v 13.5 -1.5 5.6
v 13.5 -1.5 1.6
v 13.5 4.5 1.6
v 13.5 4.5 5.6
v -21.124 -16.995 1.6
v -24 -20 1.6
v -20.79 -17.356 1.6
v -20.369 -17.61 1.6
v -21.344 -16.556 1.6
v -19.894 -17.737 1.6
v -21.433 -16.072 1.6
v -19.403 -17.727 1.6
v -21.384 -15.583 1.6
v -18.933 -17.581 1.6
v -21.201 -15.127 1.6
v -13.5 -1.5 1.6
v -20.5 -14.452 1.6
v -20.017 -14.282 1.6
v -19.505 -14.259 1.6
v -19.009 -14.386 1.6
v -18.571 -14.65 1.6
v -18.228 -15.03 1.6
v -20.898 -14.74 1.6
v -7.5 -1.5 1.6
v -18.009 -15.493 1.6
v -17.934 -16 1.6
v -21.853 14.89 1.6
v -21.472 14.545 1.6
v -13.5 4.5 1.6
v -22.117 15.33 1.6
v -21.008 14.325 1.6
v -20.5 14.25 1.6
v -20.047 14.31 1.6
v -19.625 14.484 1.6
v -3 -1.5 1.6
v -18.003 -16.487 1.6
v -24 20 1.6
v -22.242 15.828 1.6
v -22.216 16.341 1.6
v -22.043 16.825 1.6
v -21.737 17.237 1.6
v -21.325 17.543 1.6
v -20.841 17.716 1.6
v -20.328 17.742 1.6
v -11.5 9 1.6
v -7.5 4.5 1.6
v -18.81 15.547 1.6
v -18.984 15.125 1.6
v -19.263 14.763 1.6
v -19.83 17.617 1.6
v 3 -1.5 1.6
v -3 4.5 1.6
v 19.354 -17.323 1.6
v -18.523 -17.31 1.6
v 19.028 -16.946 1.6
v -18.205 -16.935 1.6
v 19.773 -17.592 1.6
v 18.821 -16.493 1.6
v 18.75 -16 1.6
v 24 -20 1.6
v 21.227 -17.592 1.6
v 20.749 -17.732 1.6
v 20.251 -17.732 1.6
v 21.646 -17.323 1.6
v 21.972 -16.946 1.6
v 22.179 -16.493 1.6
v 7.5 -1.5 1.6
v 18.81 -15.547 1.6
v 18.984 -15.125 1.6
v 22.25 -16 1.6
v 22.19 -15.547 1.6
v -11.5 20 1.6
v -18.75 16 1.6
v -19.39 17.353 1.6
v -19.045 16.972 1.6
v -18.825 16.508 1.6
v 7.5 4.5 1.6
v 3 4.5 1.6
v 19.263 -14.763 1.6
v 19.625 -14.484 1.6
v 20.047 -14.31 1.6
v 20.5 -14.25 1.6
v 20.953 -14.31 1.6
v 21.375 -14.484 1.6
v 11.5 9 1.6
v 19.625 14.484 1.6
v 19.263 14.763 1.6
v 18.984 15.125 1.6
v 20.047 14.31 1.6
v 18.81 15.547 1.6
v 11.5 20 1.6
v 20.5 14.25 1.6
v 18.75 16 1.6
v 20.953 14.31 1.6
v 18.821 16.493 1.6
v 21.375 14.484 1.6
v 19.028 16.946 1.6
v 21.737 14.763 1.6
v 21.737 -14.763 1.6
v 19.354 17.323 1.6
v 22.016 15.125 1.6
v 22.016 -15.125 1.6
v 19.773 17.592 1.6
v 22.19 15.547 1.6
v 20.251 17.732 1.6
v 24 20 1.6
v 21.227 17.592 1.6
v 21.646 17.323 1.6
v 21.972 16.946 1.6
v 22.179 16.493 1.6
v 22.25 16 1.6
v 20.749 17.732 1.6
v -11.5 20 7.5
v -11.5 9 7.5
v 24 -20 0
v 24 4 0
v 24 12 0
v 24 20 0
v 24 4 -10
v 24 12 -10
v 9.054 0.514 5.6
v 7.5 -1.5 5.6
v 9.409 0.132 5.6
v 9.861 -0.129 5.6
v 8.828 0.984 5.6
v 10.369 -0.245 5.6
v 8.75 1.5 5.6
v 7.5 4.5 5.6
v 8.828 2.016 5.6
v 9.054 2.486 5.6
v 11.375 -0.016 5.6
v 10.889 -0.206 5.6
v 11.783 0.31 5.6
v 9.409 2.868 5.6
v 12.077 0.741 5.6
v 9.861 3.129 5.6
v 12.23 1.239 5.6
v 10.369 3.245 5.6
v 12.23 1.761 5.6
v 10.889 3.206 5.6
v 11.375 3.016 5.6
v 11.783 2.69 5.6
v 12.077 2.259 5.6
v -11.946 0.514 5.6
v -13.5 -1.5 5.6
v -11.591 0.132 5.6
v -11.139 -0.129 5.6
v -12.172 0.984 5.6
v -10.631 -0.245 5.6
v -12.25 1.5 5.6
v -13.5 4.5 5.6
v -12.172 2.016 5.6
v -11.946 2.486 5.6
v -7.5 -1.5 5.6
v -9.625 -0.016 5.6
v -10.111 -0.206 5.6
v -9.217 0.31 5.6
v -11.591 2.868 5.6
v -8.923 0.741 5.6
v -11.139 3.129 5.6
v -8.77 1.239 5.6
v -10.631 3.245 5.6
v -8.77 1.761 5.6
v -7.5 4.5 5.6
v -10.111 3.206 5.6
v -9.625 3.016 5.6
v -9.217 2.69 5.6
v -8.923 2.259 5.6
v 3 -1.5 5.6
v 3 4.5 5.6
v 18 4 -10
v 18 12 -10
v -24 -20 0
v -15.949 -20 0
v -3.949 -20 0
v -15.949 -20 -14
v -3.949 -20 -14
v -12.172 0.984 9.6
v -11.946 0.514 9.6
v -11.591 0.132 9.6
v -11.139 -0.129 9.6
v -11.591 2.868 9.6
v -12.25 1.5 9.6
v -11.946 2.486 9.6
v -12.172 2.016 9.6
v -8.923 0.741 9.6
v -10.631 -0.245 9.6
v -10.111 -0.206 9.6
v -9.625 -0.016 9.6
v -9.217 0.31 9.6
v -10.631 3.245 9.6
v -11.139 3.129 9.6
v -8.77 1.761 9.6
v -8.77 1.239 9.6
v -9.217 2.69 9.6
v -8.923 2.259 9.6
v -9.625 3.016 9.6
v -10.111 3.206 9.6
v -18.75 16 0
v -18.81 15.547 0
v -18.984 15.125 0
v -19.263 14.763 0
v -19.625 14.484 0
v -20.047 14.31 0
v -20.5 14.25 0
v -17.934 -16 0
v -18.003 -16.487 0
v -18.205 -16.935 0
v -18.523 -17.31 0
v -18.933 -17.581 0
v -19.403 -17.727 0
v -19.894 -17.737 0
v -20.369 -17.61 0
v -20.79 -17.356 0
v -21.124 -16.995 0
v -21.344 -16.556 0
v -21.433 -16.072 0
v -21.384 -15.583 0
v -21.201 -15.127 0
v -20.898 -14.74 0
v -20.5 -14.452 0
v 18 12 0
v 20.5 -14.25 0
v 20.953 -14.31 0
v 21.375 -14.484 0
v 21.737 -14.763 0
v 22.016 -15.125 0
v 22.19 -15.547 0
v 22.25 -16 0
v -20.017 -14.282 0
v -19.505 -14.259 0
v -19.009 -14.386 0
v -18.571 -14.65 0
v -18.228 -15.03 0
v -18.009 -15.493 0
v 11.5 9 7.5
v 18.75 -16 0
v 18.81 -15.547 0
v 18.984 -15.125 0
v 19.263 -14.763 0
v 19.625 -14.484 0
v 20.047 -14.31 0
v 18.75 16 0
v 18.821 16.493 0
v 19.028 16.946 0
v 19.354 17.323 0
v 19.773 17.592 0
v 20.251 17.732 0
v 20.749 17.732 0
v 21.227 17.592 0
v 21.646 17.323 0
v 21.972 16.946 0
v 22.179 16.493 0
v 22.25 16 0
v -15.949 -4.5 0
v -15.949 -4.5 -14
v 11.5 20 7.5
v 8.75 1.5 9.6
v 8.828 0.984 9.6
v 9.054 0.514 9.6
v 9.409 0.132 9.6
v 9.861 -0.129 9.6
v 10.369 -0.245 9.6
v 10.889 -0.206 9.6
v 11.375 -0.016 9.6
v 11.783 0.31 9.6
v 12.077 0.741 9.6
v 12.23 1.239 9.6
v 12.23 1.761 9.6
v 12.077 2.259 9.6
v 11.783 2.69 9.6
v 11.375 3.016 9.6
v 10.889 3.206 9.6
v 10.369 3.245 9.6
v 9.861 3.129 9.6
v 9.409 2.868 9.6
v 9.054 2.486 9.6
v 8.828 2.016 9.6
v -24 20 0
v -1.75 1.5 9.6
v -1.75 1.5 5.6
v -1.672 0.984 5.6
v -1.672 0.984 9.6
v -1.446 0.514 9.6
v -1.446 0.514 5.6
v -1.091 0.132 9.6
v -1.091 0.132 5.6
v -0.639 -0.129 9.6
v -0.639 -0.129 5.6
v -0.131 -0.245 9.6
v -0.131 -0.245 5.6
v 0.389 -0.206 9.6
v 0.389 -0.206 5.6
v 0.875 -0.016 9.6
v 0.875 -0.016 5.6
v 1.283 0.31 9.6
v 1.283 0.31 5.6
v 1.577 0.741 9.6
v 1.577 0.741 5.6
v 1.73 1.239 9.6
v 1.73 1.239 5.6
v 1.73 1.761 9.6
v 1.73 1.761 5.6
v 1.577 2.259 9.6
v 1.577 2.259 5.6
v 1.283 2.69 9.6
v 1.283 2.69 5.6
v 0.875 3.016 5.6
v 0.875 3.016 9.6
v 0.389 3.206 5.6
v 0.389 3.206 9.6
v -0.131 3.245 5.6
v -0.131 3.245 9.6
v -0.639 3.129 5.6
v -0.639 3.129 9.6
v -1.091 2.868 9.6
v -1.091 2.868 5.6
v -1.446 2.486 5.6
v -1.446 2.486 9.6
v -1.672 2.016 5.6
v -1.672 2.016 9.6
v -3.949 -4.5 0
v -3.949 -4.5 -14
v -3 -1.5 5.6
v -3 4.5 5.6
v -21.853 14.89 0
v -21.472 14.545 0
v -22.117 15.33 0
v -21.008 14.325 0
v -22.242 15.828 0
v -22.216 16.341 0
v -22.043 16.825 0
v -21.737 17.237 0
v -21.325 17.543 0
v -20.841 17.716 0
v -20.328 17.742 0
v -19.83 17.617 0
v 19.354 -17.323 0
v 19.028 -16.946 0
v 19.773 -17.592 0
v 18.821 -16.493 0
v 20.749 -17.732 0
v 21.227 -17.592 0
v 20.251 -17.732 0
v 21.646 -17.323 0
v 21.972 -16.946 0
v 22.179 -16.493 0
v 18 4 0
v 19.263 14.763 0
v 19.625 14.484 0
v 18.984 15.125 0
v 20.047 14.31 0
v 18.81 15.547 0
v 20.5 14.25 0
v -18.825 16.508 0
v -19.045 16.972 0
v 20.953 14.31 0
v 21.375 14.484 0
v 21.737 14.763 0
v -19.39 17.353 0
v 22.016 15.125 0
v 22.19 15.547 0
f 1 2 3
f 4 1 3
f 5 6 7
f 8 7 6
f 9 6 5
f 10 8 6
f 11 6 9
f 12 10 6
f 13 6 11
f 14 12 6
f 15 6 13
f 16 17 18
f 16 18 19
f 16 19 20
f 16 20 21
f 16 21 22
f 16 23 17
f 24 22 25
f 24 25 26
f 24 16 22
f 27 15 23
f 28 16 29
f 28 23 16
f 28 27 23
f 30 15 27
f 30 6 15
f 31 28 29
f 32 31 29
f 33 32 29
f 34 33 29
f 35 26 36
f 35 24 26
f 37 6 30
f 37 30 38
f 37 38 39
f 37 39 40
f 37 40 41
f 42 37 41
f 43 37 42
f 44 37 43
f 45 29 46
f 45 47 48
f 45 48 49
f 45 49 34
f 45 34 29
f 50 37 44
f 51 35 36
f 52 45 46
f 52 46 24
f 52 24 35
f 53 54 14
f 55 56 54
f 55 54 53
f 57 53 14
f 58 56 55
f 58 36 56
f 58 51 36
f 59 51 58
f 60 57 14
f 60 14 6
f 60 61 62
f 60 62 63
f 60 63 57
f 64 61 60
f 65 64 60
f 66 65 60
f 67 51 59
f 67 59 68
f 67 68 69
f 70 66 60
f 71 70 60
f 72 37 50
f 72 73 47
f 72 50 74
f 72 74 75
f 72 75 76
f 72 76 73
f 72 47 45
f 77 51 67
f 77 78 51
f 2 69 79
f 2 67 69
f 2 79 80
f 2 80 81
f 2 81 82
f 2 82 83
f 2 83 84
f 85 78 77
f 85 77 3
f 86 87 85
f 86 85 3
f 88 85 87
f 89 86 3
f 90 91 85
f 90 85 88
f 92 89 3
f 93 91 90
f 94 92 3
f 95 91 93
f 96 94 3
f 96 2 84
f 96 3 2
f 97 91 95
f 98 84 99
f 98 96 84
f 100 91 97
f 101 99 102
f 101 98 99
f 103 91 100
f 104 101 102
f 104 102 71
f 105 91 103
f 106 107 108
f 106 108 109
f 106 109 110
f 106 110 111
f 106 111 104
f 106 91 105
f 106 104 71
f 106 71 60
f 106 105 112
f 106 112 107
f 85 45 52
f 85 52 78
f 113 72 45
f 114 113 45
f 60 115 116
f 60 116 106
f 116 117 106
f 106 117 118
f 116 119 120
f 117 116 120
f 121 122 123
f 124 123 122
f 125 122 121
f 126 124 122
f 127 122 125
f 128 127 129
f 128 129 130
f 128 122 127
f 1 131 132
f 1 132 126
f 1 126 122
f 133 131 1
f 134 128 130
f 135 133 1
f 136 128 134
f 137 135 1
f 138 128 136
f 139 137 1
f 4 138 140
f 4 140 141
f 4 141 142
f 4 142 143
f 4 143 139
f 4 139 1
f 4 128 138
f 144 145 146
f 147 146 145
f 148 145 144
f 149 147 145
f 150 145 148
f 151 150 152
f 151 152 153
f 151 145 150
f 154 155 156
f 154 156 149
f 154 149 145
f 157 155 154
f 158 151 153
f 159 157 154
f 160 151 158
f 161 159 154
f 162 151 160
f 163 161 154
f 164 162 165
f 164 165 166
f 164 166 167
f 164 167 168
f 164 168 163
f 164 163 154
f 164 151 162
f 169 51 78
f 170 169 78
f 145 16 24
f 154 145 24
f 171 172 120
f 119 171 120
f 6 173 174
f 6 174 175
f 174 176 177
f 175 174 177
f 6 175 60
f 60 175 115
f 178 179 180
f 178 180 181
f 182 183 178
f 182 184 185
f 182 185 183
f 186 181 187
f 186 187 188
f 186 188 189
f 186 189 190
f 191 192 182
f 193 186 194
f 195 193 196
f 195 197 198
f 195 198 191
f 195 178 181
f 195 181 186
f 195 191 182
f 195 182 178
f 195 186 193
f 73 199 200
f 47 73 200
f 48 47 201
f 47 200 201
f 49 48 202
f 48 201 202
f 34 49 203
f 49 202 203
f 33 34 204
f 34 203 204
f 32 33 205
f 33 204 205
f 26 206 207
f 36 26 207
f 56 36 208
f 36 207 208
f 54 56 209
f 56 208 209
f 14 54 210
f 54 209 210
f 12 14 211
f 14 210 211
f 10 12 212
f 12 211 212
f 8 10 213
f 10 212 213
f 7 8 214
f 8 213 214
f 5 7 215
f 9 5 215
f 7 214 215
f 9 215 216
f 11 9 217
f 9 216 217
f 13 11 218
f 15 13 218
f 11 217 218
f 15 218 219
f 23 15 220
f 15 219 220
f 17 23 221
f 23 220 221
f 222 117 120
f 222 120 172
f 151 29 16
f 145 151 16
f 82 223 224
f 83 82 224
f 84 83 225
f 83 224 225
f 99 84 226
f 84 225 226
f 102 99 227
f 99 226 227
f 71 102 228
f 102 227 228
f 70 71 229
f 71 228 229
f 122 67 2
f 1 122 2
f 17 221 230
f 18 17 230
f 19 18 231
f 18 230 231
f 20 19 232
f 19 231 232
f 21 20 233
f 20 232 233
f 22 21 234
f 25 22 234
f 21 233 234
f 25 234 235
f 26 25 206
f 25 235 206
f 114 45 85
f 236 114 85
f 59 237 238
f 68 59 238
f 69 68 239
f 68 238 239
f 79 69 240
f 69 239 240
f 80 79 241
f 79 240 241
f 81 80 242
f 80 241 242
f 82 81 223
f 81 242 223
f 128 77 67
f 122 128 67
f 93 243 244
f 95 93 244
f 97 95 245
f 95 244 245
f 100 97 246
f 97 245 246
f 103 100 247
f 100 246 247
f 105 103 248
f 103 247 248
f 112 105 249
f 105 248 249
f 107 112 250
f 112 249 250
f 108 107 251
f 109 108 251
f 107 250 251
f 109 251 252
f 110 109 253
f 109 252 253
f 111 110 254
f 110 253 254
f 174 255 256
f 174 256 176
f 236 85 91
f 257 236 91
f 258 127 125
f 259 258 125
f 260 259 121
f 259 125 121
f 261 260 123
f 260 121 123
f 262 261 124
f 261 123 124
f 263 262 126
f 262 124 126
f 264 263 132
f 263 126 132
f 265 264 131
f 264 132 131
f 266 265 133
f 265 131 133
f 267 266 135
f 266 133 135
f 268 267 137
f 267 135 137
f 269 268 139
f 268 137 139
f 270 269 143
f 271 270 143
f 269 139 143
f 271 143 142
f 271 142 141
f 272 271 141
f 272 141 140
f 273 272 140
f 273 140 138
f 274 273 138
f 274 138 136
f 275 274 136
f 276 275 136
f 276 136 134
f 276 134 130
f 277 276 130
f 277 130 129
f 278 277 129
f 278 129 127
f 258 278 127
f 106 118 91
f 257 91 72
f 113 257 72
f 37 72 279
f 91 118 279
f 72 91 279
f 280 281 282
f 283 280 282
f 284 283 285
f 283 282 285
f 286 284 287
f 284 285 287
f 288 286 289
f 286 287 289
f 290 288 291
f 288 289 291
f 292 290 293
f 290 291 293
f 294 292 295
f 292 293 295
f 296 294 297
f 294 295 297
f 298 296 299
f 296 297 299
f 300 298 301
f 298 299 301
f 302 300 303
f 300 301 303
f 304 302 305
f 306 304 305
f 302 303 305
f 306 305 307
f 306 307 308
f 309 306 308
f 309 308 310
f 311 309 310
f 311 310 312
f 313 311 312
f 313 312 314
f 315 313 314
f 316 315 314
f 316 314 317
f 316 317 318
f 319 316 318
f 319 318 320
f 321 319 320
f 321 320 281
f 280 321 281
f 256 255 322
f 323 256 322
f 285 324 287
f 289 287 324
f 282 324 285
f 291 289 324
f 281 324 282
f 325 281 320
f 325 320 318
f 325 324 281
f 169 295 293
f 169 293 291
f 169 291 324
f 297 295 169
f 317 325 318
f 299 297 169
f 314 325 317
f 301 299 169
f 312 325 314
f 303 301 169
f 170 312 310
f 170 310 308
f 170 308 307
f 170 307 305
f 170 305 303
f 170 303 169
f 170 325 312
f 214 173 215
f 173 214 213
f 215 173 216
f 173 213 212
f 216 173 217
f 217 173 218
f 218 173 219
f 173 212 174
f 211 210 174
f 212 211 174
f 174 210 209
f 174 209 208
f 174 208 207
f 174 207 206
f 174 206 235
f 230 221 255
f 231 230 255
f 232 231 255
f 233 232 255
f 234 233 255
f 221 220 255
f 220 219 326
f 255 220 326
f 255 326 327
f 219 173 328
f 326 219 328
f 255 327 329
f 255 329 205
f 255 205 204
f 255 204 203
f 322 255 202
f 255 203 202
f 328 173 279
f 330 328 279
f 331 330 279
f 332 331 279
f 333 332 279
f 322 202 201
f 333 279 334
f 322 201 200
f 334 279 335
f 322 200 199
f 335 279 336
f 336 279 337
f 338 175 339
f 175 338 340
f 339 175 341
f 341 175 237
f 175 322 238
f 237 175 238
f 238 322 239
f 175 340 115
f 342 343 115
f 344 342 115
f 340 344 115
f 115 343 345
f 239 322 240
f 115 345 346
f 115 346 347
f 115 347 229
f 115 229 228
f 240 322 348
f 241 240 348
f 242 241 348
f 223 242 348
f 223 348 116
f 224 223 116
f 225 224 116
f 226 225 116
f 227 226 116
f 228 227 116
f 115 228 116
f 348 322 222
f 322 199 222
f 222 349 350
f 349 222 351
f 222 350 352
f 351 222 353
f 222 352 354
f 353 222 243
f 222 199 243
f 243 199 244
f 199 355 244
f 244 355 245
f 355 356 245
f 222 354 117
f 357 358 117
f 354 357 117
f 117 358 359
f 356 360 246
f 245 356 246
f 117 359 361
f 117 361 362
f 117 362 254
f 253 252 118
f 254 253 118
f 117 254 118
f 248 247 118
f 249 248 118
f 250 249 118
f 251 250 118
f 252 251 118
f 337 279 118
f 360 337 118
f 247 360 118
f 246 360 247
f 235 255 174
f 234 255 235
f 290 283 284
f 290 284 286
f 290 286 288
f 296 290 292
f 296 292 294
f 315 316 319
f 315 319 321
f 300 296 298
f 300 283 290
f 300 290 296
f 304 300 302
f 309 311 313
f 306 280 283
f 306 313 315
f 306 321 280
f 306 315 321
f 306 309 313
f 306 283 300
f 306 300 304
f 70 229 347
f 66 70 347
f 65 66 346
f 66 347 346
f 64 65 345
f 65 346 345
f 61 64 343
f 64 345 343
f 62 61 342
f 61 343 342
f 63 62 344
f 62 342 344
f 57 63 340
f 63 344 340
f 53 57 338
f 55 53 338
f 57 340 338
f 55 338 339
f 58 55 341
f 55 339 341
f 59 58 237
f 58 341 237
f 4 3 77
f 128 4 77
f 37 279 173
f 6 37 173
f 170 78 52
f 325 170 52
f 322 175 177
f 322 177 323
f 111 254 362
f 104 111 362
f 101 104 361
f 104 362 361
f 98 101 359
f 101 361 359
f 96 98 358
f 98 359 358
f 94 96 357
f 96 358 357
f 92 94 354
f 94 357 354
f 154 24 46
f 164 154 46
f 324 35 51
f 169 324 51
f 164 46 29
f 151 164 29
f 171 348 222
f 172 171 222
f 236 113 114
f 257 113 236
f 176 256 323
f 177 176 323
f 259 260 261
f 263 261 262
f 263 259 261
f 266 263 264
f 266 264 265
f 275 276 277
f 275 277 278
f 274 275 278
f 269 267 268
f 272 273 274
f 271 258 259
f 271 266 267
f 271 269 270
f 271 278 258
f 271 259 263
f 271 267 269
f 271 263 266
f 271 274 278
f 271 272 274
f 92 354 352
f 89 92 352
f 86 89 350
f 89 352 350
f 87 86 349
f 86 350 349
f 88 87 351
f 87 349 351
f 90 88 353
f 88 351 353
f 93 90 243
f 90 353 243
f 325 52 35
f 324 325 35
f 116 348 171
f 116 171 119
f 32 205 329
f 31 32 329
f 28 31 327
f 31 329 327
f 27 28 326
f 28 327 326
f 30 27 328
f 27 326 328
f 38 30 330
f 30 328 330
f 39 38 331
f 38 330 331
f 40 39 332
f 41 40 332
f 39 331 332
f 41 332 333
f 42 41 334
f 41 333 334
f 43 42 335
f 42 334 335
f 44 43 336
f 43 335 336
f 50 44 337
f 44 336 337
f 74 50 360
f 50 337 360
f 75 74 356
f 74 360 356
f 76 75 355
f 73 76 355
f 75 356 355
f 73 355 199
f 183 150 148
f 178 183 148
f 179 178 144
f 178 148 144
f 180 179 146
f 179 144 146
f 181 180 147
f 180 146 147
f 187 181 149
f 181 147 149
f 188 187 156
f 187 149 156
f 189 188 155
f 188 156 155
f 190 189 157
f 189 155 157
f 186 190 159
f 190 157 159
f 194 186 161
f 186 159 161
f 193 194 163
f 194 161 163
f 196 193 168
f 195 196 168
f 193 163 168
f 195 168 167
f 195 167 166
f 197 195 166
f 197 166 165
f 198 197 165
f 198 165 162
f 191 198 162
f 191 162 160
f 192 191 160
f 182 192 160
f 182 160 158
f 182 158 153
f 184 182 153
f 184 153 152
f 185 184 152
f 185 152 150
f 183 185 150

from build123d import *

# Parameters (mm, degrees)
F0_W     = 12
F0_H     = 11.5
F0_H_2   = 4
F0_W_2   = 3.5
F0_H_3   = 8
F0_H_4   = 2.5
F0_W_3   = 2.5
F1_DEPTH = 1.6
F0_W_4   = 23
F0_H_5   = 7
F2_DEPTH = 7.5
F3_DEPTH = 5.6
F4_DEPTH = 9.6
F5_DEPTH = 14
F6_DEPTH = 10


with BuildPart() as f1:
    # F0 (on Top) → F1 (new body)
    with BuildSketch(Plane.XY):
        with BuildLine():
            Line((-11.5, 16), (-18.75, 16))
            ThreePointArc((-18.75, 16), (-19.2625631329, 14.7625631329), (-20.5, 14.25))
            Line((-20.5, 14.25), (-20.5, 1.5))
            Line((-20.5, 1.5), (-13.5, 1.5))
            Line((-13.5, 1.5), (-13.5, 4.5))
            Line((-13.5, 4.5), (-7.5, 4.5))
            Line((-7.5, 4.5), (-7.5, 1.5))
            Line((-7.5, 1.5), (-3, 1.5))
            Line((-3, 1.5), (-3, 4.5))
            Line((-3, 4.5), (3, 4.5))
            Line((3, 4.5), (3, 1.5))
            Line((3, 1.5), (7.5, 1.5))
            Line((7.5, 1.5), (7.5, 4.5))
            Line((7.5, 4.5), (13.5, 4.5))
            Line((13.5, 4.5), (13.5, 1.5))
            Line((13.5, 1.5), (20.5, 1.5))
            Line((20.5, 1.5), (20.5, 4))
            Line((20.5, 4), (18, 4))
            Line((18, 4), (18, 12))
            Line((18, 12), (20.5, 12))
            Line((20.5, 12), (20.5, 14.25))
            ThreePointArc((20.5, 14.25), (19.2625631329, 14.7625631329), (18.75, 16))
            Line((18.75, 16), (11.5, 16))
            Line((11.5, 16), (11.5, 9))
            Line((11.5, 9), (-11.5, 9))
            Line((-11.5, 9), (-11.5, 16))
        make_face()
        with BuildLine():
            ThreePointArc((-20.5, 14.25), (-21.7374368671, 17.2374368671), (-18.75, 16))
            Line((-18.75, 16), (-11.5, 16))
            Line((-11.5, 16), (-11.5, 20))
            Line((-11.5, 20), (-24, 20))
            Line((-24, 20), (-24, 1.5))
            Line((-24, 1.5), (-20.5, 1.5))
            Line((-20.5, 1.5), (-20.5, 14.25))
        make_face()
        with BuildLine():
            Line((11.5, 20), (11.5, 16))
            Line((11.5, 16), (18.75, 16))
            ThreePointArc((18.75, 16), (20.5, 17.75), (22.25, 16))
            ThreePointArc((22.25, 16), (21.7374368671, 14.7625631329), (20.5, 14.25))
            Line((20.5, 14.25), (20.5, 12))
            Line((20.5, 12), (24, 12))
            Line((24, 12), (24, 20))
            Line((24, 20), (11.5, 20))
        make_face()
        with BuildLine():
            Line((-13.5, 1.5), (-20.5, 1.5))
            Line((-20.5, 1.5), (-20.5, -14.4517312036))
            ThreePointArc((-20.5, -14.4517312036), (-18.7801368934, -14.5016722582), (-17.9343016893, -16))
            Line((-17.9343016893, -16), (-15.9493740648, -16))
            Line((-15.9493740648, -16), (-15.9493740648, -4.5))
            Line((-15.9493740648, -4.5), (-3.9493740648, -4.5))
            Line((-3.9493740648, -4.5), (-3.9493740648, -16))
            Line((-3.9493740648, -16), (18.75, -16))
            ThreePointArc((18.75, -16), (19.2625631329, -14.7625631329), (20.5, -14.25))
            Line((20.5, -14.25), (20.5, 1.5))
            Line((20.5, 1.5), (13.5, 1.5))
            Line((13.5, 1.5), (13.5, -1.5))
            Line((13.5, -1.5), (7.5, -1.5))
            Line((7.5, -1.5), (7.5, 1.5))
            Line((7.5, 1.5), (3, 1.5))
            Line((3, 1.5), (3, -1.5))
            Line((3, -1.5), (-3, -1.5))
            Line((-3, -1.5), (-3, 1.5))
            Line((-3, 1.5), (-7.5, 1.5))
            Line((-7.5, 1.5), (-7.5, -1.5))
            Line((-7.5, -1.5), (-13.5, -1.5))
            Line((-13.5, -1.5), (-13.5, 1.5))
        make_face()
        with BuildLine():
            Line((-20.5, -14.4517312036), (-20.5, 1.5))
            Line((-20.5, 1.5), (-24, 1.5))
            Line((-24, 1.5), (-24, -20))
            Line((-24, -20), (-15.9493740648, -20))
            Line((-15.9493740648, -20), (-15.9493740648, -16))
            Line((-15.9493740648, -16), (-17.9343016893, -16))
            ThreePointArc((-17.9343016893, -16), (-20.5884664851, -17.4983277418), (-20.5, -14.4517312036))
        make_face()
        with BuildLine():
            Line((18.75, -16), (-3.9493740648, -16))
            Line((-3.9493740648, -16), (-3.9493740648, -20))
            Line((-3.9493740648, -20), (24, -20))
            Line((24, -20), (24, 1.5))
            Line((24, 1.5), (20.5, 1.5))
            Line((20.5, 1.5), (20.5, -14.25))
            ThreePointArc((20.5, -14.25), (21.7374368671, -14.7625631329), (22.25, -16))
            ThreePointArc((22.25, -16), (20.5, -17.75), (18.75, -16))
        make_face()
        with Locations((-9.9493740648, -10.25)):
            Rectangle(F0_W, F0_H)
        with Locations((-9.9493740648, -18)):
            Rectangle(F0_W, F0_H_2)
        with Locations((22.25, 8)):
            Rectangle(F0_W_2, F0_H_3)
        with Locations((22.25, 2.75)):
            Rectangle(F0_W_2, F0_H_4)
        with Locations((19.25, 8)):
            Rectangle(F0_W_3, F0_H_3)
        with BuildLine():
            Line((-13.5, 4.5), (-13.5, 1.5))
            Line((-13.5, 1.5), (-12.25, 1.5))
            ThreePointArc((-12.25, 1.5), (-10.5, 3.25), (-8.75, 1.5))
            Line((-8.75, 1.5), (-7.5, 1.5))
            Line((-7.5, 1.5), (-7.5, 4.5))
            Line((-7.5, 4.5), (-13.5, 4.5))
        make_face()
        with BuildLine():
            Line((-3, 4.5), (-3, 1.5))
            Line((-3, 1.5), (-1.75, 1.5))
            ThreePointArc((-1.75, 1.5), (0, 3.25), (1.75, 1.5))
            Line((1.75, 1.5), (3, 1.5))
            Line((3, 1.5), (3, 4.5))
            Line((3, 4.5), (-3, 4.5))
        make_face()
        with BuildLine():
            Line((12.25, 1.5), (13.5, 1.5))
            Line((13.5, 1.5), (13.5, 4.5))
            Line((13.5, 4.5), (7.5, 4.5))
            Line((7.5, 4.5), (7.5, 1.5))
            Line((7.5, 1.5), (8.75, 1.5))
            ThreePointArc((8.75, 1.5), (10.5, 3.25), (12.25, 1.5))
        make_face()
        with BuildLine():
            ThreePointArc((-8.75, 1.5), (-10.5, 3.25), (-12.25, 1.5))
            Line((-12.25, 1.5), (-8.75, 1.5))
        make_face()
        with BuildLine():
            Line((-8.75, 1.5), (-12.25, 1.5))
            ThreePointArc((-12.25, 1.5), (-10.5, -0.25), (-8.75, 1.5))
        make_face()
        with BuildLine():
            Line((-12.25, 1.5), (-13.5, 1.5))
            Line((-13.5, 1.5), (-13.5, -1.5))
            Line((-13.5, -1.5), (-7.5, -1.5))
            Line((-7.5, -1.5), (-7.5, 1.5))
            Line((-7.5, 1.5), (-8.75, 1.5))
            ThreePointArc((-8.75, 1.5), (-10.5, -0.25), (-12.25, 1.5))
        make_face()
        with BuildLine():
            Line((-1.75, 1.5), (-3, 1.5))
            Line((-3, 1.5), (-3, -1.5))
            Line((-3, -1.5), (3, -1.5))
            Line((3, -1.5), (3, 1.5))
            Line((3, 1.5), (1.75, 1.5))
            ThreePointArc((1.75, 1.5), (0, -0.25), (-1.75, 1.5))
        make_face()
        with BuildLine():
            Line((1.75, 1.5), (-1.75, 1.5))
            ThreePointArc((-1.75, 1.5), (0, -0.25), (1.75, 1.5))
        make_face()
        with BuildLine():
            ThreePointArc((1.75, 1.5), (0, 3.25), (-1.75, 1.5))
            Line((-1.75, 1.5), (1.75, 1.5))
        make_face()
        with BuildLine():
            Line((8.75, 1.5), (12.25, 1.5))
            ThreePointArc((12.25, 1.5), (10.5, 3.25), (8.75, 1.5))
        make_face()
        with BuildLine():
            ThreePointArc((8.75, 1.5), (10.5, -0.25), (12.25, 1.5))
            Line((12.25, 1.5), (8.75, 1.5))
        make_face()
        with BuildLine():
            Line((13.5, -1.5), (13.5, 1.5))
            Line((13.5, 1.5), (12.25, 1.5))
            ThreePointArc((12.25, 1.5), (10.5, -0.25), (8.75, 1.5))
            Line((8.75, 1.5), (7.5, 1.5))
            Line((7.5, 1.5), (7.5, -1.5))
            Line((7.5, -1.5), (13.5, -1.5))
        make_face()
    extrude(amount=F1_DEPTH)

    # F0 (on Top) → F2 (join)
    with BuildSketch(Plane.XY):
        with Locations((0, 12.5)):
            Rectangle(F0_W_4, F0_H_5)
        with Locations((0, 18)):
            Rectangle(F0_W_4, F0_H_2)
    extrude(amount=F2_DEPTH)

    # F0 (on Top) → F3 (join)
    with BuildSketch(Plane.XY):
        with BuildLine():
            Line((-13.5, 4.5), (-13.5, 1.5))
            Line((-13.5, 1.5), (-12.25, 1.5))
            ThreePointArc((-12.25, 1.5), (-10.5, 3.25), (-8.75, 1.5))
            Line((-8.75, 1.5), (-7.5, 1.5))
            Line((-7.5, 1.5), (-7.5, 4.5))
            Line((-7.5, 4.5), (-13.5, 4.5))
        make_face()
        with BuildLine():
            Line((-12.25, 1.5), (-13.5, 1.5))
            Line((-13.5, 1.5), (-13.5, -1.5))
            Line((-13.5, -1.5), (-7.5, -1.5))
            Line((-7.5, -1.5), (-7.5, 1.5))
            Line((-7.5, 1.5), (-8.75, 1.5))
            ThreePointArc((-8.75, 1.5), (-10.5, -0.25), (-12.25, 1.5))
        make_face()
        with BuildLine():
            Line((-3, 4.5), (-3, 1.5))
            Line((-3, 1.5), (-1.75, 1.5))
            ThreePointArc((-1.75, 1.5), (0, 3.25), (1.75, 1.5))
            Line((1.75, 1.5), (3, 1.5))
            Line((3, 1.5), (3, 4.5))
            Line((3, 4.5), (-3, 4.5))
        make_face()
        with BuildLine():
            Line((-1.75, 1.5), (-3, 1.5))
            Line((-3, 1.5), (-3, -1.5))
            Line((-3, -1.5), (3, -1.5))
            Line((3, -1.5), (3, 1.5))
            Line((3, 1.5), (1.75, 1.5))
            ThreePointArc((1.75, 1.5), (0, -0.25), (-1.75, 1.5))
        make_face()
        with BuildLine():
            Line((12.25, 1.5), (13.5, 1.5))
            Line((13.5, 1.5), (13.5, 4.5))
            Line((13.5, 4.5), (7.5, 4.5))
            Line((7.5, 4.5), (7.5, 1.5))
            Line((7.5, 1.5), (8.75, 1.5))
            ThreePointArc((8.75, 1.5), (10.5, 3.25), (12.25, 1.5))
        make_face()
        with BuildLine():
            Line((13.5, -1.5), (13.5, 1.5))
            Line((13.5, 1.5), (12.25, 1.5))
            ThreePointArc((12.25, 1.5), (10.5, -0.25), (8.75, 1.5))
            Line((8.75, 1.5), (7.5, 1.5))
            Line((7.5, 1.5), (7.5, -1.5))
            Line((7.5, -1.5), (13.5, -1.5))
        make_face()
    extrude(amount=F3_DEPTH)

    # F0 (on Top) → F4 (join)
    with BuildSketch(Plane.XY):
        with BuildLine():
            ThreePointArc((1.75, 1.5), (0, 3.25), (-1.75, 1.5))
            Line((-1.75, 1.5), (1.75, 1.5))
        make_face()
        with BuildLine():
            Line((1.75, 1.5), (-1.75, 1.5))
            ThreePointArc((-1.75, 1.5), (0, -0.25), (1.75, 1.5))
        make_face()
        with BuildLine():
            ThreePointArc((-8.75, 1.5), (-10.5, 3.25), (-12.25, 1.5))
            Line((-12.25, 1.5), (-8.75, 1.5))
        make_face()
        with BuildLine():
            Line((-8.75, 1.5), (-12.25, 1.5))
            ThreePointArc((-12.25, 1.5), (-10.5, -0.25), (-8.75, 1.5))
        make_face()
        with BuildLine():
            Line((8.75, 1.5), (12.25, 1.5))
            ThreePointArc((12.25, 1.5), (10.5, 3.25), (8.75, 1.5))
        make_face()
        with BuildLine():
            ThreePointArc((8.75, 1.5), (10.5, -0.25), (12.25, 1.5))
            Line((12.25, 1.5), (8.75, 1.5))
        make_face()
    extrude(amount=F4_DEPTH)

    # F0 (on Top) → F5 (join)
    with BuildSketch(Plane.XY):
        with Locations((-9.9493740648, -10.25)):
            Rectangle(F0_W, F0_H)
        with Locations((-9.9493740648, -18)):
            Rectangle(F0_W, F0_H_2)
    extrude(amount=-F5_DEPTH)

    # F0 (on Top) → F6 (join)
    with BuildSketch(Plane.XY):
        with Locations((22.25, 8)):
            Rectangle(F0_W_2, F0_H_3)
        with Locations((19.25, 8)):
            Rectangle(F0_W_3, F0_H_3)
    extrude(amount=-F6_DEPTH)


solid = f1.part
